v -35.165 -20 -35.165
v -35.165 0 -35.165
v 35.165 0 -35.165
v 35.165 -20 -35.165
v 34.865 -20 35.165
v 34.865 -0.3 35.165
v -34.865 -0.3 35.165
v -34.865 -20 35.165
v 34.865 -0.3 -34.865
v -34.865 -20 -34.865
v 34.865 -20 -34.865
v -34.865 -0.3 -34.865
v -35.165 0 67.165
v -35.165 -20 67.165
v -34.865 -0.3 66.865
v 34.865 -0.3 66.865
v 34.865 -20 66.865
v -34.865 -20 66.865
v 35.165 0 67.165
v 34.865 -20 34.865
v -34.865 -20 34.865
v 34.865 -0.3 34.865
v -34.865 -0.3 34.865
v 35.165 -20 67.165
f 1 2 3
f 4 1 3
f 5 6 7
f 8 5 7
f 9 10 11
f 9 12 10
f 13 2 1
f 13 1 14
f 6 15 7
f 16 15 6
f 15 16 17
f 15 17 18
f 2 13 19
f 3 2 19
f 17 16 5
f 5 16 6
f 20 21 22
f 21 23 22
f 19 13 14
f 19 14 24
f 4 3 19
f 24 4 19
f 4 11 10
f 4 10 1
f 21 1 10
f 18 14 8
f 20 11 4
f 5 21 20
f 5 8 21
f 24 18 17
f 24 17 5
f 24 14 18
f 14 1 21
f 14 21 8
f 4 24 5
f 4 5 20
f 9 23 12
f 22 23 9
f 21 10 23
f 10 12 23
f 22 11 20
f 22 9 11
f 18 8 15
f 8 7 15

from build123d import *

# Parameters (mm, degrees)
F0_W     = 70.33
F0_H     = 70.33
F1_DEPTH = 20
F2_T     = -0.3
F0_H_2   = 32
F3_DEPTH = 20
F4_T     = -0.3


# Not quite as in the source:
# - a shell that OpenCascade refuses in one call is made with other operations: the cavity is built on its own and cut out


with BuildPart() as f1:
    # F0 (on Front) → F1 (new body)
    with BuildSketch(Plane.XZ):
        Rectangle(F0_W, F0_H)
    extrude(amount=F1_DEPTH)

    # F2
    f2_openings = [f1.faces().sort_by_distance(p)[0] for p in [
        (0, -20, 0),
    ]]
    offset(amount=F2_T, openings=f2_openings)

    # F0 (on Front) → F3 (join)
    with BuildSketch(Plane.XZ):
        with Locations((0, 51.165)):
            Rectangle(F0_W, F0_H_2)
    extrude(amount=F3_DEPTH)

    # F4: a shell. OpenCascade refuses it in one call, so the cavity is built on its own and cut out:
    # the body offset inwards by the wall thickness, plus a prism from it out through each open face.
    f4_core = offset(f1.part, amount=F4_T, kind=Kind.INTERSECTION, mode=Mode.PRIVATE)
    f4_exits = [f4_core.faces().sort_by_distance(p)[0] for p in [
        (0, -19.7, 51.015),
    ]]
    add(f4_core, mode=Mode.SUBTRACT)
    extrude(f4_exits, amount=-F4_T, mode=Mode.SUBTRACT)


solid = f1.part
